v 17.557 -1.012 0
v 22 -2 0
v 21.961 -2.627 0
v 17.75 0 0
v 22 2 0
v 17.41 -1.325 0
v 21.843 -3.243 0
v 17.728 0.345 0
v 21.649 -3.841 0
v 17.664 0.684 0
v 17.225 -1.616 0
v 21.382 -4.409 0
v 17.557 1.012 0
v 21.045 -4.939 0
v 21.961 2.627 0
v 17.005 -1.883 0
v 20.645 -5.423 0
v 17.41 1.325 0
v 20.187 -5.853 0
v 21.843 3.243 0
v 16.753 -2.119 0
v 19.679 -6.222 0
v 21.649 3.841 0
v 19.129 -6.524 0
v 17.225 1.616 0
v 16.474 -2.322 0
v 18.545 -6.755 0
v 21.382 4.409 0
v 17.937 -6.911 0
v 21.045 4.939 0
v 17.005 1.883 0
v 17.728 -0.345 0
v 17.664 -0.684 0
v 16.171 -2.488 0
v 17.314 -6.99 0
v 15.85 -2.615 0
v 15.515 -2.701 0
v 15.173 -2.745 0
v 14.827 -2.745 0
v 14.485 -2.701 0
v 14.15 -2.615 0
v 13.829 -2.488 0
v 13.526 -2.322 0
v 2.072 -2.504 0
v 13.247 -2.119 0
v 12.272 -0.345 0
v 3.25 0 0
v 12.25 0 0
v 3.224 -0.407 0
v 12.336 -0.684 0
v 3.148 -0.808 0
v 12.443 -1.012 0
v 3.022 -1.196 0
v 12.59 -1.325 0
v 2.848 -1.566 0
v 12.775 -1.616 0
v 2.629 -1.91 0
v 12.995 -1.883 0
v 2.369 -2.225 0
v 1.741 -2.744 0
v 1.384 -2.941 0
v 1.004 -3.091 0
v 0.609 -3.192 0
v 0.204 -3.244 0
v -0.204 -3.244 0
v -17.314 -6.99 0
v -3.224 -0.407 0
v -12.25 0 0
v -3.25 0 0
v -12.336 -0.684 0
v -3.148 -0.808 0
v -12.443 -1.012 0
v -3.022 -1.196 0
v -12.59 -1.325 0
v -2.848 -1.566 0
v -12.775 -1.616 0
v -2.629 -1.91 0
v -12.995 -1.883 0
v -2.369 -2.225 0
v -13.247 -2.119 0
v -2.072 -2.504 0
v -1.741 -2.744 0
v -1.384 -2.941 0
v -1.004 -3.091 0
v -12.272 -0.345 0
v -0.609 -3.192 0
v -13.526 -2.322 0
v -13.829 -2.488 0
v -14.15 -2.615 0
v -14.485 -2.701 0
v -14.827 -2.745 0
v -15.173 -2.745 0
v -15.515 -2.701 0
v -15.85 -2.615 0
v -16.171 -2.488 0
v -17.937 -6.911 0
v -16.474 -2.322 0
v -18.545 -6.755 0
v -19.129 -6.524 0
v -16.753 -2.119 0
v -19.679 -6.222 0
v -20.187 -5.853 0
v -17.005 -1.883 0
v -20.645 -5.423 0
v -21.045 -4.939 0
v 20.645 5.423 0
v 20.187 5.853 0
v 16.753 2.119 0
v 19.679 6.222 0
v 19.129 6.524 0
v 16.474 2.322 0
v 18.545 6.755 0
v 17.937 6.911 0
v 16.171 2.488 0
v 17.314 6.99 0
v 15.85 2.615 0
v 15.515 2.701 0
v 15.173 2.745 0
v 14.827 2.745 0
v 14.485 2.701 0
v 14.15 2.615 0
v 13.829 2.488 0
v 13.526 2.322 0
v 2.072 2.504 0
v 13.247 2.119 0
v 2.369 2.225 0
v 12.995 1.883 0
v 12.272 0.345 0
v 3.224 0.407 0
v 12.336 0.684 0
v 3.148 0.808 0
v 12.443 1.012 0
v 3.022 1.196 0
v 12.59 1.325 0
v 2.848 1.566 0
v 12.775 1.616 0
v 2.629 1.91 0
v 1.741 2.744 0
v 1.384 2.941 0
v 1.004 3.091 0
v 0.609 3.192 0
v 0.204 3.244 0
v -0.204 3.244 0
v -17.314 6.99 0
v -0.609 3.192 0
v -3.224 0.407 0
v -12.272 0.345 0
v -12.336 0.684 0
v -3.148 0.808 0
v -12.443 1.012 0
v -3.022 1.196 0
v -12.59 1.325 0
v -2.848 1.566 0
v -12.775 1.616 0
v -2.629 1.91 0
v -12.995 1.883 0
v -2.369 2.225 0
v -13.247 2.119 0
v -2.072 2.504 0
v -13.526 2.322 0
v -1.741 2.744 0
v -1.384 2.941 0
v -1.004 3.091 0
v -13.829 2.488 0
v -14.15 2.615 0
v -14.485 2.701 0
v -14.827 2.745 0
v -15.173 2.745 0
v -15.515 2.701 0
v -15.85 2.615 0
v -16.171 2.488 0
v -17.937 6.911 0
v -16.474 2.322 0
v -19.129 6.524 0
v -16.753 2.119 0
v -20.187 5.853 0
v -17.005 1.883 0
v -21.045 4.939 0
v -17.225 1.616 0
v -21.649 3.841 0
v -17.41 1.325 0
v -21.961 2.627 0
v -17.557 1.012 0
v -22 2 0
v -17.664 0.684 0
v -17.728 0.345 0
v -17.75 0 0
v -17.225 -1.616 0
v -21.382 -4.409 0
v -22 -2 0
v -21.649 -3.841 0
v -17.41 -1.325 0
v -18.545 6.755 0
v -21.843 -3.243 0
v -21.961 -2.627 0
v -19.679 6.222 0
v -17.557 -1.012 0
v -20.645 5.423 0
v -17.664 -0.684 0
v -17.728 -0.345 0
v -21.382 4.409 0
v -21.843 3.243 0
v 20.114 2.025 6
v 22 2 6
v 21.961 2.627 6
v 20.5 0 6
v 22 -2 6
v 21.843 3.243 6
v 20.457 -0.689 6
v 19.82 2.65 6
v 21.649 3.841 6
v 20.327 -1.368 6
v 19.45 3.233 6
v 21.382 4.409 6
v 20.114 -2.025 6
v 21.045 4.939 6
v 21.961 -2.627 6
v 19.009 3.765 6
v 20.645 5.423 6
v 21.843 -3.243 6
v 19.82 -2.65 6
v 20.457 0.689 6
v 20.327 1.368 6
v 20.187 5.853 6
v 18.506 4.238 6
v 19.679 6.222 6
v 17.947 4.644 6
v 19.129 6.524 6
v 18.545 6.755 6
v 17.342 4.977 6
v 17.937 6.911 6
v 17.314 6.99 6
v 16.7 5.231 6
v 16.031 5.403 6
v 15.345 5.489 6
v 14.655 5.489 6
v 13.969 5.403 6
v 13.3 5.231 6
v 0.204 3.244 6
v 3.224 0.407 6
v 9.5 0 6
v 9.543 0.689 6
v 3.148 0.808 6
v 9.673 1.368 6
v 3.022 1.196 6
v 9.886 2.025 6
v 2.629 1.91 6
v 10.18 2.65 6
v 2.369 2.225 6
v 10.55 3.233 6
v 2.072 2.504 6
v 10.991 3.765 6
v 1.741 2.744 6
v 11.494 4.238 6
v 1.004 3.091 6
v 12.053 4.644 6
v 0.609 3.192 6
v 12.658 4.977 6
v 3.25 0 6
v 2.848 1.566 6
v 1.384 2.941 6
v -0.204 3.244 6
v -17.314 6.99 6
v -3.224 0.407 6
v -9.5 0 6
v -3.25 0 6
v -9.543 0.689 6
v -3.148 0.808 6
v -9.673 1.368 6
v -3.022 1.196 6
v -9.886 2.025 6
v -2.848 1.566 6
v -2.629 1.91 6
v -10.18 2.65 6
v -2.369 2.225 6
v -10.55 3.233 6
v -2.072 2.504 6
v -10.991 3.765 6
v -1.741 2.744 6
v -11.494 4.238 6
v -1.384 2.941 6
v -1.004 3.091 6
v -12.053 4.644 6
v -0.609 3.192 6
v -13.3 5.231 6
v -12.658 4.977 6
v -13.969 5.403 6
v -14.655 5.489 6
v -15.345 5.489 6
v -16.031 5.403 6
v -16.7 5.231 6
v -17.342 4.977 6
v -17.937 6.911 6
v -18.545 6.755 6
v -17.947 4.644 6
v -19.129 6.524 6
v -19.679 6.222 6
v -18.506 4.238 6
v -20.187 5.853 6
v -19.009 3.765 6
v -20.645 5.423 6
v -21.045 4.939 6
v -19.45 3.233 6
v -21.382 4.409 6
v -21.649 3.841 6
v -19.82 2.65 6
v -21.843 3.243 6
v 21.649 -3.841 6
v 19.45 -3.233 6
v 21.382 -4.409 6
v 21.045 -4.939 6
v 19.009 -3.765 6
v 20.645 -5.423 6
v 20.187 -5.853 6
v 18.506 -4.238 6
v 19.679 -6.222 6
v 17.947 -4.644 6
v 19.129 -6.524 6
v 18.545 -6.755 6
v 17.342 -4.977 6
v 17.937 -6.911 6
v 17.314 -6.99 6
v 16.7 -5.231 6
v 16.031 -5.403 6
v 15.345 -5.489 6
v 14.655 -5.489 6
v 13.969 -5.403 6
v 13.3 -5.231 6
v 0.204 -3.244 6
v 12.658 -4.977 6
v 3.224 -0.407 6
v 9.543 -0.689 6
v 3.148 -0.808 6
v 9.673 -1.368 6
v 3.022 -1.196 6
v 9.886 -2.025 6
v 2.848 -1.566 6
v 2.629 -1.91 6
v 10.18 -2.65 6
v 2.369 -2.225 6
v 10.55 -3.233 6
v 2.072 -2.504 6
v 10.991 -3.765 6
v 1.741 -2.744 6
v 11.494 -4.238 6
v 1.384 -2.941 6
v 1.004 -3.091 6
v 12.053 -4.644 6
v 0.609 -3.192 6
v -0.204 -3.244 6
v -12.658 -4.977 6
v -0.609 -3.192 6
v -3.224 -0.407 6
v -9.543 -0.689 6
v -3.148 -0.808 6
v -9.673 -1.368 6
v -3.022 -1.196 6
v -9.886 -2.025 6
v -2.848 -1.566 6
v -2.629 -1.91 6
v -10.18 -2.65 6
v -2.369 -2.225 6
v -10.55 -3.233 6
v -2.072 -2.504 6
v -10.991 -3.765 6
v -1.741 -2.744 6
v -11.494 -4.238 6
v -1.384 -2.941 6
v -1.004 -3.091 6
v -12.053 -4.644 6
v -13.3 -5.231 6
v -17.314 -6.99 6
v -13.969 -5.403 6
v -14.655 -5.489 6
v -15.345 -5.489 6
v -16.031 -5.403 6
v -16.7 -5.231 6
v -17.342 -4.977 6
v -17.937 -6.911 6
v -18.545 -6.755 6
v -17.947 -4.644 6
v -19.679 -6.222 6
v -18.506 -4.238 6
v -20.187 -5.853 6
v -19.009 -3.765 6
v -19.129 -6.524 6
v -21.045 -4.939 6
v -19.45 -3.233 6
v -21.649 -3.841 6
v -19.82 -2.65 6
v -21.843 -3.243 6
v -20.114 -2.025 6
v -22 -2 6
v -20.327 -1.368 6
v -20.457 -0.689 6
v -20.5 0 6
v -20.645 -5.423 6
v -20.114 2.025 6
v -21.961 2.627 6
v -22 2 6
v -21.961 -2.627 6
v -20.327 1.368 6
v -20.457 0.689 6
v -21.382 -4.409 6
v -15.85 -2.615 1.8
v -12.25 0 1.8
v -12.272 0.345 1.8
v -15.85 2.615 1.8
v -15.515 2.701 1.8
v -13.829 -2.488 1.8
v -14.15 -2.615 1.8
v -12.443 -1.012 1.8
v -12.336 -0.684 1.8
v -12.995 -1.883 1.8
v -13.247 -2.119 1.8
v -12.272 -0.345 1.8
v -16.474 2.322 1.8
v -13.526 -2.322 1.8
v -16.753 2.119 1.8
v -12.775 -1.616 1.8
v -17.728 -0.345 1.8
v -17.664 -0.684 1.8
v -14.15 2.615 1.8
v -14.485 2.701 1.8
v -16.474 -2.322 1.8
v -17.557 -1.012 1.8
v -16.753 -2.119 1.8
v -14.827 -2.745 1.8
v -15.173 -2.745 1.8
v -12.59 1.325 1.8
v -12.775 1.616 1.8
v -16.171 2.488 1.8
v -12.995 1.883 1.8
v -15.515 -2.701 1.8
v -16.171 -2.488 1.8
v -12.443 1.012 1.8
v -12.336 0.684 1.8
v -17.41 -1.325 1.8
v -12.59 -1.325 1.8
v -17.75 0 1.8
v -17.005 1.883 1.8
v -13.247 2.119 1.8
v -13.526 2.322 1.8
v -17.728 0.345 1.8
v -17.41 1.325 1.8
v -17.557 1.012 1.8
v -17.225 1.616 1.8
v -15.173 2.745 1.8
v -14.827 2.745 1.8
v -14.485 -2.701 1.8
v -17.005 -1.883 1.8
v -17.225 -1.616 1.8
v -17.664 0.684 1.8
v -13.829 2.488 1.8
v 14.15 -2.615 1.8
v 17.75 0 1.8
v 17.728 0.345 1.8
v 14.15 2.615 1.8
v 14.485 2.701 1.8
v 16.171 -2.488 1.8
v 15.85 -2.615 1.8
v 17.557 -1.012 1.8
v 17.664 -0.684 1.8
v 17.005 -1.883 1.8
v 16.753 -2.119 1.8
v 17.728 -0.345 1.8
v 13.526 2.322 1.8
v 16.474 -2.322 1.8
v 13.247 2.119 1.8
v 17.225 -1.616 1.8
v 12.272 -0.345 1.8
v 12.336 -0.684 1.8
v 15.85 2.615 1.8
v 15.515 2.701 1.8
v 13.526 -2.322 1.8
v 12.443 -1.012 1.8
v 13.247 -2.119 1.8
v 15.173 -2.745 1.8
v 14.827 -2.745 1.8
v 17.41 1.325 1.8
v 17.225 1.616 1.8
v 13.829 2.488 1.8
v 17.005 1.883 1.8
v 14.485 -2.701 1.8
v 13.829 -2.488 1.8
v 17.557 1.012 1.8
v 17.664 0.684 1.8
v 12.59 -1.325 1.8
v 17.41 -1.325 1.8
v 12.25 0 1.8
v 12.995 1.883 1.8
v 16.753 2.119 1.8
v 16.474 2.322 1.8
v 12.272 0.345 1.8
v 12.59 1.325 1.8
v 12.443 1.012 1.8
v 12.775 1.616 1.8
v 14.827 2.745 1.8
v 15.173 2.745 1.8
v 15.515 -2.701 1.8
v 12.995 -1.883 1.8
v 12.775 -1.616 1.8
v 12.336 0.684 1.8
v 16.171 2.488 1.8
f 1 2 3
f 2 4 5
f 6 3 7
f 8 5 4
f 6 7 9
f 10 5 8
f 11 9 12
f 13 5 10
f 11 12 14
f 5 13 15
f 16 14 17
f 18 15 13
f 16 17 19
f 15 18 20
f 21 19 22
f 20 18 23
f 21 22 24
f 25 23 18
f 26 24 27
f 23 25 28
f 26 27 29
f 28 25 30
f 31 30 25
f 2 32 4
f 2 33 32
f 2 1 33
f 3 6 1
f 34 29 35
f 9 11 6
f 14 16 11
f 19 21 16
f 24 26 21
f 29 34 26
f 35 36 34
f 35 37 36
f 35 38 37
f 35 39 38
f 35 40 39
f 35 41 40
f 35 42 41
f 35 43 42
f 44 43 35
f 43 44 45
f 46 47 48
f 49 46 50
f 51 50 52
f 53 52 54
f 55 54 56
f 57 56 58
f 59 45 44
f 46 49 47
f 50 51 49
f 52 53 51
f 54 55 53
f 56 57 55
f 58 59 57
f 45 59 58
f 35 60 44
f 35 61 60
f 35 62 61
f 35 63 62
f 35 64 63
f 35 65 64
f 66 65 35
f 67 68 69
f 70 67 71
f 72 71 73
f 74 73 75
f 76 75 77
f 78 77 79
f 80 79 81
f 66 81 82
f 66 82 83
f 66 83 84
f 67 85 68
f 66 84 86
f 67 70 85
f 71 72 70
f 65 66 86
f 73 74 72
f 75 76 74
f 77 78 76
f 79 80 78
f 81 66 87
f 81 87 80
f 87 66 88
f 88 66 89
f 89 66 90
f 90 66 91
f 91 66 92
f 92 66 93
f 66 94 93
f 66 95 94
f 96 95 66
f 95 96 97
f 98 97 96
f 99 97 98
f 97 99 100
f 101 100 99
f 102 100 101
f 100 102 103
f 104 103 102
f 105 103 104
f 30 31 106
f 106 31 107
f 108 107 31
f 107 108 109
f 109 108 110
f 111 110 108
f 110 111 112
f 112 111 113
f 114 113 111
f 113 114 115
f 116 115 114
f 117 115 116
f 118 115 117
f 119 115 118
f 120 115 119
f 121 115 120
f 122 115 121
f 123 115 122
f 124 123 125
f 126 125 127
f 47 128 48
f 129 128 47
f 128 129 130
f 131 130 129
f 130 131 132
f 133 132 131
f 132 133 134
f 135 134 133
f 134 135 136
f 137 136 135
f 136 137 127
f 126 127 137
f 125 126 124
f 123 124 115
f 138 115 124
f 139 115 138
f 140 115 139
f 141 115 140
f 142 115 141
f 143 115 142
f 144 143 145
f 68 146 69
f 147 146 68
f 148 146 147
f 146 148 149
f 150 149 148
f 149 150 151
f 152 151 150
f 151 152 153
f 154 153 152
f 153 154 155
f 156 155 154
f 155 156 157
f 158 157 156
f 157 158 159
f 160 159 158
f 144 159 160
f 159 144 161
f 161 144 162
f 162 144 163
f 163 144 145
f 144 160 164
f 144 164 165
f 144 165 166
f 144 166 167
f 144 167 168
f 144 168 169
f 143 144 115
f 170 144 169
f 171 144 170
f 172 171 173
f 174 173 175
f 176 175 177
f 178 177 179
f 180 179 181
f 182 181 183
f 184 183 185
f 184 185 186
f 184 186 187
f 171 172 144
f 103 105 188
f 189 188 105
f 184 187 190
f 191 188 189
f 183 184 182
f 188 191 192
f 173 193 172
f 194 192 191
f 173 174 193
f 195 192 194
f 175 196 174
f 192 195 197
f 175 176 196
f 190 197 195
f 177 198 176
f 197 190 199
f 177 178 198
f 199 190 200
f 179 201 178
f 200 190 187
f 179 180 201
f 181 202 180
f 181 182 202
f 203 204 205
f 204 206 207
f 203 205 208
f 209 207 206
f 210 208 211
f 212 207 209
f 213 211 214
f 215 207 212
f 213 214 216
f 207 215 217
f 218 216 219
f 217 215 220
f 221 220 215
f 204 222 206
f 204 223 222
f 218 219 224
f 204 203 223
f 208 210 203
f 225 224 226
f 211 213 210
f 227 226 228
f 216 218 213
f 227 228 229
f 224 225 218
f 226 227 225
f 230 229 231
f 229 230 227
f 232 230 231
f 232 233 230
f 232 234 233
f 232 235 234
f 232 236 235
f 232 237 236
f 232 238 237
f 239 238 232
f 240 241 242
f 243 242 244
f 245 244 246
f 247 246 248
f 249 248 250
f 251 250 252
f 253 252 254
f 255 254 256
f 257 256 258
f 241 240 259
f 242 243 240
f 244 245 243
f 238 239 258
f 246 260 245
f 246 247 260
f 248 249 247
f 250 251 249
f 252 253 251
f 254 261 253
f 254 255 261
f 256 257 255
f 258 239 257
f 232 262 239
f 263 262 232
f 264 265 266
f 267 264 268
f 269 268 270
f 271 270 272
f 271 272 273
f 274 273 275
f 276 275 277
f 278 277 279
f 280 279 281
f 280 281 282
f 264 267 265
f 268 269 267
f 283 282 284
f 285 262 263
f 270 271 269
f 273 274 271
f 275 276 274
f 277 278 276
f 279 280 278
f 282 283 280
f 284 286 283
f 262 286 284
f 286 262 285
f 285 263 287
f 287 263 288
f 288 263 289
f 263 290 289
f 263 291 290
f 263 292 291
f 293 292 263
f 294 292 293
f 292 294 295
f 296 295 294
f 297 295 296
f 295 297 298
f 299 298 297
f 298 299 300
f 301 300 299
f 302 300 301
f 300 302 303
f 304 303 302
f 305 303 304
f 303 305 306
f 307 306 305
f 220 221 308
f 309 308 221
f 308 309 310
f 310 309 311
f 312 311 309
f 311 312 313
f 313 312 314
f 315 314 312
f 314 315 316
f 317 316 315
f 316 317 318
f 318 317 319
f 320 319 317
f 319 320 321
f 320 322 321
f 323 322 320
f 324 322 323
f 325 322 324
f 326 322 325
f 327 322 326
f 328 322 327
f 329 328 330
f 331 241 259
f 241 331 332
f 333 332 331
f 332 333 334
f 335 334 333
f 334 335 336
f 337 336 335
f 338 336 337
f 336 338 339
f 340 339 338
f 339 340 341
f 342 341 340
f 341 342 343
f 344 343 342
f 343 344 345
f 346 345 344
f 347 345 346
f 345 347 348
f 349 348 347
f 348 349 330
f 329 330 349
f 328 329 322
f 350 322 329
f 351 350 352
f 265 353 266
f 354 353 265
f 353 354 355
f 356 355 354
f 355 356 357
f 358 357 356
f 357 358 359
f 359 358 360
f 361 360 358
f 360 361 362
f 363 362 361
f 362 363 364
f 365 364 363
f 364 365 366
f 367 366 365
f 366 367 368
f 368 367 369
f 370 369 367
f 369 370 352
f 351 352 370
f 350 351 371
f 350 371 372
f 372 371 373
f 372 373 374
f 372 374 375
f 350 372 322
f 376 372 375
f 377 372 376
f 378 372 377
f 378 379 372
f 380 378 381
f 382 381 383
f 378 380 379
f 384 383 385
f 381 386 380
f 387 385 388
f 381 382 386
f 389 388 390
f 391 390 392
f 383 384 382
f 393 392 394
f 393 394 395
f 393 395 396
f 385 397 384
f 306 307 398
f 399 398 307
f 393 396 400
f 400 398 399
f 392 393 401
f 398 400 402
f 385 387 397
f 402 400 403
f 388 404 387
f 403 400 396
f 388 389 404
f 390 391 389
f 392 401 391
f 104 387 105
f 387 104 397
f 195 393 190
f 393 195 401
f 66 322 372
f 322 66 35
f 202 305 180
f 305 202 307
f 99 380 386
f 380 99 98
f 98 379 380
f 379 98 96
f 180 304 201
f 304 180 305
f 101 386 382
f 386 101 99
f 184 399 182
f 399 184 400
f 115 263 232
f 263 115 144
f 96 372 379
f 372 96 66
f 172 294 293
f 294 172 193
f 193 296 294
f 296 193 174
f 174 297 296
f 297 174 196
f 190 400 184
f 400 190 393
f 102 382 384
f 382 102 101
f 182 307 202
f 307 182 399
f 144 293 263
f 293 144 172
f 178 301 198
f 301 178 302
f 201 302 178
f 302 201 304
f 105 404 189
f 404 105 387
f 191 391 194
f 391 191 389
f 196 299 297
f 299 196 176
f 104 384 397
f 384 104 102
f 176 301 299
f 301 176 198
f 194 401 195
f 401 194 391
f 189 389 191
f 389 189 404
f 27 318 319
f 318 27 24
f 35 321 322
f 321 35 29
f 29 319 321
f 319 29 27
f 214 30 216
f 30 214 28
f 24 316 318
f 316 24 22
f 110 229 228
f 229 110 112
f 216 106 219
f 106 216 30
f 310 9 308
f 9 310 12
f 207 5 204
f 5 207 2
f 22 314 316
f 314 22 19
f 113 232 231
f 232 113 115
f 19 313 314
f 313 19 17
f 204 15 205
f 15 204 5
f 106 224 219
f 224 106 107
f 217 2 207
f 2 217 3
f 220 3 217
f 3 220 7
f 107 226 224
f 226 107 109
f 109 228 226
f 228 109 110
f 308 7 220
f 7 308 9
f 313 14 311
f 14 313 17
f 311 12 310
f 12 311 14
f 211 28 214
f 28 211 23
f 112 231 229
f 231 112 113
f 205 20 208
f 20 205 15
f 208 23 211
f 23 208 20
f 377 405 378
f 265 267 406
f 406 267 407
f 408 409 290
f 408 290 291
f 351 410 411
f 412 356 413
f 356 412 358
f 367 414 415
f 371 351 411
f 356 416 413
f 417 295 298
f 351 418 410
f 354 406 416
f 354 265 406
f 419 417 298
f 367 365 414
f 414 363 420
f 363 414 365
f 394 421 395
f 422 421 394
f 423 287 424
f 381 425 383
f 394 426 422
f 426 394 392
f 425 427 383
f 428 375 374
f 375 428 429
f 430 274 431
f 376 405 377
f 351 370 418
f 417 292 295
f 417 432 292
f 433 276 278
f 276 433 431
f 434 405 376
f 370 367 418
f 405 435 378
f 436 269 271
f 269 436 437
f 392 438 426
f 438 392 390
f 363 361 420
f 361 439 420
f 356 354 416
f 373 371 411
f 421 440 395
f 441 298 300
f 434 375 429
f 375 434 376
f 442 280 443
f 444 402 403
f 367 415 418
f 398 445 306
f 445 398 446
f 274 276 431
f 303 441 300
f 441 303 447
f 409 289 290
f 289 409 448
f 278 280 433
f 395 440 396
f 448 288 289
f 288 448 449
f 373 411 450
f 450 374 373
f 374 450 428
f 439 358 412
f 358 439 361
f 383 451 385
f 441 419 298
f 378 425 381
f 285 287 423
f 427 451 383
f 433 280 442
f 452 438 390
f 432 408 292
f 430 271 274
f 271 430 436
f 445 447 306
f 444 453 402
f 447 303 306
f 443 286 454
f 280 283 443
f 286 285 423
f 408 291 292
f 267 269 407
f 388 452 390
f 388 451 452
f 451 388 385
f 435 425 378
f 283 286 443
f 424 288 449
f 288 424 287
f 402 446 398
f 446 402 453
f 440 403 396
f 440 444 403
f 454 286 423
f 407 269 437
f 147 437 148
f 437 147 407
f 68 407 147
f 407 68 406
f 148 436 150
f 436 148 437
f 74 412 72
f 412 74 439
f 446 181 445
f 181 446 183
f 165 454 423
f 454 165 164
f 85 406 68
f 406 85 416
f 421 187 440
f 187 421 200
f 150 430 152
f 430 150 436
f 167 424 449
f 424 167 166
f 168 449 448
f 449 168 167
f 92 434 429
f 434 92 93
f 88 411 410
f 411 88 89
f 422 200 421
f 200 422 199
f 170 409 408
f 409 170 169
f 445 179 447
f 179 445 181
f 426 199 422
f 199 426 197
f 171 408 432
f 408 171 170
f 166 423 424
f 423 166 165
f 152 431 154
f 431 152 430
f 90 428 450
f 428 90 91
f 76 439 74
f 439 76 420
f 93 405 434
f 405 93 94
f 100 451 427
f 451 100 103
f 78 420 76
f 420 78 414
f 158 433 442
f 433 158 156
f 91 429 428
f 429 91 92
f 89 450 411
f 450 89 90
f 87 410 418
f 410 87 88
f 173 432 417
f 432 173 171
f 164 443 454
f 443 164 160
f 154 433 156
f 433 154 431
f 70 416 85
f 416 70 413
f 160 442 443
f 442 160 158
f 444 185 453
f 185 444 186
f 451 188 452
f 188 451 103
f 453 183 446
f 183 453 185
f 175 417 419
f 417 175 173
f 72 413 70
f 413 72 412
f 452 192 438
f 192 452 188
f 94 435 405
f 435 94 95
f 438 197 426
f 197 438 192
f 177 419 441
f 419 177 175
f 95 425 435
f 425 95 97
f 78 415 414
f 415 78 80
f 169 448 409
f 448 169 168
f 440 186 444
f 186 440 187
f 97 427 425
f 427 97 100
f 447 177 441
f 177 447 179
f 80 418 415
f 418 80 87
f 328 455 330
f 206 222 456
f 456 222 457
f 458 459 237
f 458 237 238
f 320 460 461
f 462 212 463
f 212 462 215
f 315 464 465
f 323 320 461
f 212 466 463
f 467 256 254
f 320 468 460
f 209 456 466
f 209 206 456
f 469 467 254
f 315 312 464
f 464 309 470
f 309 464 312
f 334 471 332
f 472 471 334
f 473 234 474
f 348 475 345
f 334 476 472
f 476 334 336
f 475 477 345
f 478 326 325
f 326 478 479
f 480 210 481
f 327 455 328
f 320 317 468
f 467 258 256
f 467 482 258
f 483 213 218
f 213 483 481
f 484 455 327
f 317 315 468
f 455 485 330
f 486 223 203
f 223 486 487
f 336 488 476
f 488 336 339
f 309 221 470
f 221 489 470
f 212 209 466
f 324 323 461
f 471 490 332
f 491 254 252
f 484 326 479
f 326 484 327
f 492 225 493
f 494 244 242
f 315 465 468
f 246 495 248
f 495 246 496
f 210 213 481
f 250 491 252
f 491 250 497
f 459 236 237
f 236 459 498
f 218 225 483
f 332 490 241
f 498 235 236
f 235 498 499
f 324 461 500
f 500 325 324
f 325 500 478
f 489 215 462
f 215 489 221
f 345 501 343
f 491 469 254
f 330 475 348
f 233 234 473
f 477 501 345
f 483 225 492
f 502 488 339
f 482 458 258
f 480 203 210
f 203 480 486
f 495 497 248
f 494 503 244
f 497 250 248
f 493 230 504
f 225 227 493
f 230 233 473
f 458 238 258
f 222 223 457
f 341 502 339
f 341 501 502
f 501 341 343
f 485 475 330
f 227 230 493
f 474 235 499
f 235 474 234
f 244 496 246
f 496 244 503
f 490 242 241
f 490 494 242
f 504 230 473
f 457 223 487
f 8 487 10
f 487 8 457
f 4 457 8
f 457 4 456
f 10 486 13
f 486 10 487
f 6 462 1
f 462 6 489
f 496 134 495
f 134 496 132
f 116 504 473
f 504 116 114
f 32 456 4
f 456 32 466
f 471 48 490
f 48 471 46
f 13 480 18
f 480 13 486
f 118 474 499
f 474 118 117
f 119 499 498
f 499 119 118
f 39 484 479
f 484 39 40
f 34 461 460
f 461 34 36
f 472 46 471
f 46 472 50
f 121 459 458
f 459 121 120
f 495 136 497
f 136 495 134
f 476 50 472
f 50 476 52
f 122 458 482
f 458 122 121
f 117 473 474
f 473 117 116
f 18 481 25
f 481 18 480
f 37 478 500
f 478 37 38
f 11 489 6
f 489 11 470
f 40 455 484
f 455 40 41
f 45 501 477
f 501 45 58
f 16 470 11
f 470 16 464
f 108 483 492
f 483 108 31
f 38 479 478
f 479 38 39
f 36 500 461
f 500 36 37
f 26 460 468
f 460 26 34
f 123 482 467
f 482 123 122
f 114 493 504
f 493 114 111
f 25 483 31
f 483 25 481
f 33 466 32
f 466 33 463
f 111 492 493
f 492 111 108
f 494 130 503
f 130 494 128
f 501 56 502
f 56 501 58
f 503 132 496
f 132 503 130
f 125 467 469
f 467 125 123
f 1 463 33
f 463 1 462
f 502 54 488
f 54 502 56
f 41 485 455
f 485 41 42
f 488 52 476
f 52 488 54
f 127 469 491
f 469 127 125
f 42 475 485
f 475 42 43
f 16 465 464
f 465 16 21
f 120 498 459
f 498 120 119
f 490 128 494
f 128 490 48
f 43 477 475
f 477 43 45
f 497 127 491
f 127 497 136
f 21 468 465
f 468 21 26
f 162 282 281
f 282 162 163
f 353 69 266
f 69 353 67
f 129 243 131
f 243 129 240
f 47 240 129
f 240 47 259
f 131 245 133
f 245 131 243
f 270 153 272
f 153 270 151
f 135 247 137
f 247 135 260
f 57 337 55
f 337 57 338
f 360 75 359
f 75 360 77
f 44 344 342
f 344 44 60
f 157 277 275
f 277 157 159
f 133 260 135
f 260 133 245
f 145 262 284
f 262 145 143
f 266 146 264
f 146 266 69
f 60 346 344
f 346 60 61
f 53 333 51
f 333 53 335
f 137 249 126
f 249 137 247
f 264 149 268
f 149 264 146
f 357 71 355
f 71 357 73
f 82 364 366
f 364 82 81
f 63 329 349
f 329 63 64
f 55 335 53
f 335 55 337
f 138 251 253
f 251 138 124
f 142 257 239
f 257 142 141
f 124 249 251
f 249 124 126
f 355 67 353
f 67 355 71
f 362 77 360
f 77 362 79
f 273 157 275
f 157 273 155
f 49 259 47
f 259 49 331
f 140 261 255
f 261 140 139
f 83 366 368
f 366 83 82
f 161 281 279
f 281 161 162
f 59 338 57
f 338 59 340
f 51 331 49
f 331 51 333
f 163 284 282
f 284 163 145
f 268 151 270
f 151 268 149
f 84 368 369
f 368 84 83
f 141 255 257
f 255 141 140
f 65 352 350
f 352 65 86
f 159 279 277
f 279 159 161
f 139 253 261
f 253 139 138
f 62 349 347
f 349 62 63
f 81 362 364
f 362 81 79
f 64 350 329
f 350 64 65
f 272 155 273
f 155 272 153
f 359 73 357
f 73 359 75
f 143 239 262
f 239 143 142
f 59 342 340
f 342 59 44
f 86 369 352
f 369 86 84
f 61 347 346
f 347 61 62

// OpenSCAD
$fn = 50;


difference() {
	union() {
		cylinder(h = 6, r = 7.0000000000);
		translate(v = [-7.5000000000, 0.0000000000, 0]) {
			hull() {
				translate(v = [-9.5000000000, 2.0000000000, 0]) {
					cylinder(h = 6, r = 5);
				}
				translate(v = [9.5000000000, 2.0000000000, 0]) {
					cylinder(h = 6, r = 5);
				}
				translate(v = [-9.5000000000, -2.0000000000, 0]) {
					cylinder(h = 6, r = 5);
				}
				translate(v = [9.5000000000, -2.0000000000, 0]) {
					cylinder(h = 6, r = 5);
				}
			}
		}
		translate(v = [-7.5000000000, 0.0000000000, 0]) {
			hull() {
				translate(v = [-9.5000000000, 2.0000000000, 0]) {
					cylinder(h = 6, r = 5);
				}
				translate(v = [9.5000000000, 2.0000000000, 0]) {
					cylinder(h = 6, r = 5);
				}
				translate(v = [-9.5000000000, -2.0000000000, 0]) {
					cylinder(h = 6, r = 5);
				}
				translate(v = [9.5000000000, -2.0000000000, 0]) {
					cylinder(h = 6, r = 5);
				}
			}
		}
		translate(v = [7.5000000000, 0.0000000000, 0]) {
			hull() {
				translate(v = [-9.5000000000, 2.0000000000, 0]) {
					cylinder(h = 6, r = 5);
				}
				translate(v = [9.5000000000, 2.0000000000, 0]) {
					cylinder(h = 6, r = 5);
				}
				translate(v = [-9.5000000000, -2.0000000000, 0]) {
					cylinder(h = 6, r = 5);
				}
				translate(v = [9.5000000000, -2.0000000000, 0]) {
					cylinder(h = 6, r = 5);
				}
			}
		}
		translate(v = [7.5000000000, 0.0000000000, 0]) {
			hull() {
				translate(v = [-9.5000000000, 2.0000000000, 0]) {
					cylinder(h = 6, r = 5);
				}
				translate(v = [9.5000000000, 2.0000000000, 0]) {
					cylinder(h = 6, r = 5);
				}
				translate(v = [-9.5000000000, -2.0000000000, 0]) {
					cylinder(h = 6, r = 5);
				}
				translate(v = [9.5000000000, -2.0000000000, 0]) {
					cylinder(h = 6, r = 5);
				}
			}
		}
	}
	union() {
		translate(v = [-15.0000000000, 0.0000000000, 6]) {
			rotate(a = [0, 0, 0]) {
				difference() {
					union() {
						#translate(v = [0, 0, -6.0000000000]) {
							cylinder(h = 6, r = 2.2500000000);
						}
						#translate(v = [0, 0, -4.2000000000]) {
							cylinder(h = 4.2000000000, r1 = 2.7500000000, r2 = 5.5000000000);
						}
						#translate(v = [0, 0, -6.0000000000]) {
							cylinder(h = 6, r = 2.7500000000);
						}
						#translate(v = [0, 0, -6.0000000000]) {
							cylinder(h = 6, r = 2.2500000000);
						}
					}
					union();
				}
			}
		}
		translate(v = [-15.0000000000, 0.0000000000, 6]) {
			rotate(a = [0, 0, 0]) {
				difference() {
					union() {
						#translate(v = [0, 0, -6.0000000000]) {
							cylinder(h = 6, r = 2.2500000000);
						}
						#translate(v = [0, 0, -4.2000000000]) {
							cylinder(h = 4.2000000000, r1 = 2.7500000000, r2 = 5.5000000000);
						}
						#translate(v = [0, 0, -6.0000000000]) {
							cylinder(h = 6, r = 2.7500000000);
						}
						#translate(v = [0, 0, -6.0000000000]) {
							cylinder(h = 6, r = 2.2500000000);
						}
					}
					union();
				}
			}
		}
		translate(v = [15.0000000000, 0.0000000000, 6]) {
			rotate(a = [0, 0, 0]) {
				difference() {
					union() {
						#translate(v = [0, 0, -6.0000000000]) {
							cylinder(h = 6, r = 2.2500000000);
						}
						#translate(v = [0, 0, -4.2000000000]) {
							cylinder(h = 4.2000000000, r1 = 2.7500000000, r2 = 5.5000000000);
						}
						#translate(v = [0, 0, -6.0000000000]) {
							cylinder(h = 6, r = 2.7500000000);
						}
						#translate(v = [0, 0, -6.0000000000]) {
							cylinder(h = 6, r = 2.2500000000);
						}
					}
					union();
				}
			}
		}
		translate(v = [15.0000000000, 0.0000000000, 6]) {
			rotate(a = [0, 0, 0]) {
				difference() {
					union() {
						#translate(v = [0, 0, -6.0000000000]) {
							cylinder(h = 6, r = 2.2500000000);
						}
						#translate(v = [0, 0, -4.2000000000]) {
							cylinder(h = 4.2000000000, r1 = 2.7500000000, r2 = 5.5000000000);
						}
						#translate(v = [0, 0, -6.0000000000]) {
							cylinder(h = 6, r = 2.7500000000);
						}
						#translate(v = [0, 0, -6.0000000000]) {
							cylinder(h = 6, r = 2.2500000000);
						}
					}
					union();
				}
			}
		}
		translate(v = [0, 0, -100]) {
			cylinder(h = 200, r = 3.2500000000);
		}
		translate(v = [0, 0, -100]) {
			cylinder(h = 200, r = 1.8000000000);
		}
	}
}
